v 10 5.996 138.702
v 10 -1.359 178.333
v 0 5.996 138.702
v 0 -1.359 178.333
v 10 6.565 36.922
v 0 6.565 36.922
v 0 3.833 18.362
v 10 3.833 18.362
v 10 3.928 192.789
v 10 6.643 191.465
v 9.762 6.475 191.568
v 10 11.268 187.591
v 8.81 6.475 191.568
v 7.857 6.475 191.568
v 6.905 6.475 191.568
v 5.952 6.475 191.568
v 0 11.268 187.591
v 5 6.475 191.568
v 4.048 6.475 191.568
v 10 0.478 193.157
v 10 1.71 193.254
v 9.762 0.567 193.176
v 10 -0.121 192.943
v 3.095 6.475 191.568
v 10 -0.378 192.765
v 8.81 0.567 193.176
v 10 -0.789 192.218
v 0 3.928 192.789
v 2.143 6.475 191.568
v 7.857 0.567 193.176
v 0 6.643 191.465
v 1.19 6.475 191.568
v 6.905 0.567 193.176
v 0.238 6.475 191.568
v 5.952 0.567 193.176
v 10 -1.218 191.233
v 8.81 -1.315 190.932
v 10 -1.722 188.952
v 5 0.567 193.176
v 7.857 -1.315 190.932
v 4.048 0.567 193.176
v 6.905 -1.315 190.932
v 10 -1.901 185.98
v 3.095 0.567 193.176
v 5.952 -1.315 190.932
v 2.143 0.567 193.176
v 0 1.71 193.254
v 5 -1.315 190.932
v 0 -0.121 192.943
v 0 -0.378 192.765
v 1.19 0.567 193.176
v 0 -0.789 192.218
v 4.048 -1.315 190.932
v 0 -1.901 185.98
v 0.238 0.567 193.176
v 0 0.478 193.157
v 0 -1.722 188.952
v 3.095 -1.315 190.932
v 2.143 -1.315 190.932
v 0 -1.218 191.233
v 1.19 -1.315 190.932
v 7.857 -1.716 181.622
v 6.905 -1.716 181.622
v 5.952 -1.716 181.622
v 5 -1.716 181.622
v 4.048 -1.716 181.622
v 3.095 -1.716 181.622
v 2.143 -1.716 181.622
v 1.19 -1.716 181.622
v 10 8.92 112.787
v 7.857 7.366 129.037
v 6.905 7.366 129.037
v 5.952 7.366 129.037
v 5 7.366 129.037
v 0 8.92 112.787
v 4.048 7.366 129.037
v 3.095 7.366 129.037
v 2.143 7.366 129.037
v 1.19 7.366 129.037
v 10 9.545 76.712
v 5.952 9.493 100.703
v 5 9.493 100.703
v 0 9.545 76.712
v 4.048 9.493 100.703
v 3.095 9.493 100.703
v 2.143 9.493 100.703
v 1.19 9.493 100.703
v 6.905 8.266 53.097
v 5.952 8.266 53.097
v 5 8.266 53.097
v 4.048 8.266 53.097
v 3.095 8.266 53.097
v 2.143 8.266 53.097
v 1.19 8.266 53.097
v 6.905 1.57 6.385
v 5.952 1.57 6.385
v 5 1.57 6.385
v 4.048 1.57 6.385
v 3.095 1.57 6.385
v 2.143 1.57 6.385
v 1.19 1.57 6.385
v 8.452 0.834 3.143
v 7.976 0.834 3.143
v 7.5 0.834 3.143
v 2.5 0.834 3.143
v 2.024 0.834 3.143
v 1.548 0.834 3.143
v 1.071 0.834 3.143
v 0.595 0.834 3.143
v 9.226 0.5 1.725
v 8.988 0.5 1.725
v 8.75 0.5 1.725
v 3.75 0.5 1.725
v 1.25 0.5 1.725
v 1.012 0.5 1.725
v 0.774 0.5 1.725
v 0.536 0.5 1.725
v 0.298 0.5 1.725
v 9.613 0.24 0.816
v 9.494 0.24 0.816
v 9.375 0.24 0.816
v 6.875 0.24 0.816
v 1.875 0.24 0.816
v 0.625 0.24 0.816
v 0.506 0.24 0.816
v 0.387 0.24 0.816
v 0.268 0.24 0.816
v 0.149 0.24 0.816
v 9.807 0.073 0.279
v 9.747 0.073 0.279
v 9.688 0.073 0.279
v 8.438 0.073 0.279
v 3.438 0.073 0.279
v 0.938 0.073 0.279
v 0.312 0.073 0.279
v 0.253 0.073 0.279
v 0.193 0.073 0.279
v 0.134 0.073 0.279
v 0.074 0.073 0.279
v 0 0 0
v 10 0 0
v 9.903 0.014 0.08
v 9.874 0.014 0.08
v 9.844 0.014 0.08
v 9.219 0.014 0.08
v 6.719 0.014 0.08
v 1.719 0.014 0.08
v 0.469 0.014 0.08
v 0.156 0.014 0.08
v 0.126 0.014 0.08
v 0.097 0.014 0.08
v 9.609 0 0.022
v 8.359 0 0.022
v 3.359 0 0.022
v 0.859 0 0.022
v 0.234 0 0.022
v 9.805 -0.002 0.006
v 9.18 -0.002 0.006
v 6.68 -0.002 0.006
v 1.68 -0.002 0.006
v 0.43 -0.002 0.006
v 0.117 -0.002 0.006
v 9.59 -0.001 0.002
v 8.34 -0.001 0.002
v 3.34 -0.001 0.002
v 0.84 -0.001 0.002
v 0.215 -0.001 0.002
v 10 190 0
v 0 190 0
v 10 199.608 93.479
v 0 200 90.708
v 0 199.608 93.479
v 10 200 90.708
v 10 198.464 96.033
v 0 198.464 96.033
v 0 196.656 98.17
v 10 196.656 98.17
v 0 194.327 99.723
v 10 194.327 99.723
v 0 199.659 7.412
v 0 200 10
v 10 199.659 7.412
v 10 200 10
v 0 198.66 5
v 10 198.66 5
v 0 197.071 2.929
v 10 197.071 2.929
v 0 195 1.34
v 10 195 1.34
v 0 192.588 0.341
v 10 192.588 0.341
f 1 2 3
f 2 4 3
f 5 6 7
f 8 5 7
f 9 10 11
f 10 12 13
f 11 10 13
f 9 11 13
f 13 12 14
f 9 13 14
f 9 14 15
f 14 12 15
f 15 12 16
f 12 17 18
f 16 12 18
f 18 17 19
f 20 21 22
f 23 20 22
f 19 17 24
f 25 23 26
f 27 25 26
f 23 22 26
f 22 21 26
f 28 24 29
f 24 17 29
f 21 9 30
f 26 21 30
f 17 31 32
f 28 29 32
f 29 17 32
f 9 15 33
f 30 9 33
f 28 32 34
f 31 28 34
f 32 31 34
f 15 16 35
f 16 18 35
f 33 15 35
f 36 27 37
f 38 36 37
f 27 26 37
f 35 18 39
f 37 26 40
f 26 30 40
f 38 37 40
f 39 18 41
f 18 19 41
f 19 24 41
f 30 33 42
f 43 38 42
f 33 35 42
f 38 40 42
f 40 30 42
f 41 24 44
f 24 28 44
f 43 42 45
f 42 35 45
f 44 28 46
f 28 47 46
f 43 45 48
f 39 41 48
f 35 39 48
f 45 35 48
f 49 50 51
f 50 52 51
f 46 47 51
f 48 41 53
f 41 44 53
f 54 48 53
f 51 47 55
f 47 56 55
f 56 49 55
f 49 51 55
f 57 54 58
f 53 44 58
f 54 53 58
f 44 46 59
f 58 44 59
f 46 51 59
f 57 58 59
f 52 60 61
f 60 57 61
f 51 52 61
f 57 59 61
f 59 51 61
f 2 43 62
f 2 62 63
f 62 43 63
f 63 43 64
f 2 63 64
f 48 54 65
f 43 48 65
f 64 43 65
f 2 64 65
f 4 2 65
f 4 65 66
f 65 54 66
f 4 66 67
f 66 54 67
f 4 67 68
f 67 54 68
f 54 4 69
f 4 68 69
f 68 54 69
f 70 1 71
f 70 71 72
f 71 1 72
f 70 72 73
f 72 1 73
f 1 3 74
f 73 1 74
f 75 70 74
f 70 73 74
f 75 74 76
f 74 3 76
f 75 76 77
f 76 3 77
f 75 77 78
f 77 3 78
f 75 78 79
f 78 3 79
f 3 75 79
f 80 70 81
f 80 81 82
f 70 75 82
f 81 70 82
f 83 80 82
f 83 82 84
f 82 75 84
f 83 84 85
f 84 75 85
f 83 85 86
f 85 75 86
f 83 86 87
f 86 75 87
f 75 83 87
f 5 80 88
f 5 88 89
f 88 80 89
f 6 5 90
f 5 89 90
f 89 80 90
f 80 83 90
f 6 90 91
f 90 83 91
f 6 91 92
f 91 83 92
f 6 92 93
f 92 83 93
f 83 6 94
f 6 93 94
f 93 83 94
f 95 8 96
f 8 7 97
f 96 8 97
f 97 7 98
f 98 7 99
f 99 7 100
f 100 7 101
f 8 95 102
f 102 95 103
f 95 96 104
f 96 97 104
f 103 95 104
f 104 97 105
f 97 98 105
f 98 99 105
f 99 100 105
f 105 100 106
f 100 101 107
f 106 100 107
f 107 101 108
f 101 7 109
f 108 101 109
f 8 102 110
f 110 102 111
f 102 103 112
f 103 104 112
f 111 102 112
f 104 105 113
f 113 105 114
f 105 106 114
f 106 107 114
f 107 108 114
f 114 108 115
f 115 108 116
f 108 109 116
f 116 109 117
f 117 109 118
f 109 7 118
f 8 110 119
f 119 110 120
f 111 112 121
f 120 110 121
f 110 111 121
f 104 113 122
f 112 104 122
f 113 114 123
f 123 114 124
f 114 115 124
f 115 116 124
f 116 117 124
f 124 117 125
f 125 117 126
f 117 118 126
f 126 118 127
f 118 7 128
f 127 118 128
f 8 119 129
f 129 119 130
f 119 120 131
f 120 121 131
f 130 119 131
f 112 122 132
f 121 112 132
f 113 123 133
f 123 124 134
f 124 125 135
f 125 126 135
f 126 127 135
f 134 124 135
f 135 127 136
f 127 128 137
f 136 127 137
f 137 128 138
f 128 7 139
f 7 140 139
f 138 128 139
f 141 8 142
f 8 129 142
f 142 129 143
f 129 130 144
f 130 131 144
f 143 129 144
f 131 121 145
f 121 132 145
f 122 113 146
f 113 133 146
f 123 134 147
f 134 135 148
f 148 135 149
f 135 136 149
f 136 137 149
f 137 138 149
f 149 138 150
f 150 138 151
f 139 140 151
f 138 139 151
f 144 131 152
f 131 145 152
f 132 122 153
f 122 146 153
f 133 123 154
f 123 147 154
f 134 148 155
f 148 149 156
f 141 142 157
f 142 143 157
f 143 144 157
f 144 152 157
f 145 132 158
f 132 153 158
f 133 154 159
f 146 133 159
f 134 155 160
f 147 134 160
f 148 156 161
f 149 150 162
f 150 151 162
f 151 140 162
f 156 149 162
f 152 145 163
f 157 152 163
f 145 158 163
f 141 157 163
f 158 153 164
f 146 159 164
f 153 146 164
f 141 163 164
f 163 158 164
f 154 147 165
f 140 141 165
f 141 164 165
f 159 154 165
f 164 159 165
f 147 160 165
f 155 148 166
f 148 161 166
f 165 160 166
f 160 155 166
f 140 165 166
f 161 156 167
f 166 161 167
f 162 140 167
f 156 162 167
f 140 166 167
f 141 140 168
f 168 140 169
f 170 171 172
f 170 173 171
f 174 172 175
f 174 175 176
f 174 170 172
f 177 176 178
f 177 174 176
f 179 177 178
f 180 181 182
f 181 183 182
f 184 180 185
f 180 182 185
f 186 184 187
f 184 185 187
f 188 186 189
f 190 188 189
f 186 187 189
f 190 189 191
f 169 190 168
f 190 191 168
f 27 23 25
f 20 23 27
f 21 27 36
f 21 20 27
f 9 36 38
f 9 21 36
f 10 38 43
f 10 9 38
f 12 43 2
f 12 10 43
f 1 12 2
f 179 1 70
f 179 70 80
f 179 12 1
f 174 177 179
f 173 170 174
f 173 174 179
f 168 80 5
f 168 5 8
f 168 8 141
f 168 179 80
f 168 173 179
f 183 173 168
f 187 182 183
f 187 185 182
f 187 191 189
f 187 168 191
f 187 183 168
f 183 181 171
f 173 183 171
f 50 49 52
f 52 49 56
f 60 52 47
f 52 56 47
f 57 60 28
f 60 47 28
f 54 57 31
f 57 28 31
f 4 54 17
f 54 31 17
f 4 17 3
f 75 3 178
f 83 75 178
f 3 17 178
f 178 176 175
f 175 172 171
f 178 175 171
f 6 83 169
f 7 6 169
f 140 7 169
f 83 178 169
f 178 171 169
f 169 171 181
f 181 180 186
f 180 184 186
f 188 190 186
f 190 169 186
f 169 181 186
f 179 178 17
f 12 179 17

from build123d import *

# Parameters (mm, degrees)
BOSS_EXTRUDE1_DEPTH = 10
FILLET1_R           = 10
FILLET2_R           = 10


with BuildPart() as part:
    # Sketch4 → Boss-Extrude1 (new body)
    with BuildSketch(Plane(origin=(0, 0, 0), x_dir=(0, 0, -1), z_dir=(1, 0, 0))):
        with BuildLine():
            add(Edge.make_bspline(
                [(-187.591289537, 11.268146798), (-187.910759487, 10.96376416), (-189.053363989, 9.83010396), (-190.750303118, 7.849430297), (-192.319447204, 5.292227114), (-193.121118694, 3.085900933), (-193.299910313, 1.559966185), (-193.217116114, 0.756976121), (-193.135168354, 0.364638659), (-193.047057743, 0.109527208), (-192.96639442, -0.080081172), (-192.894481628, -0.209169578), (-192.813199569, -0.32939945), (-192.711052749, -0.435970861), (-192.594950194, -0.53605079), (-192.418624979, -0.673000911), (-192.159205485, -0.827368923), (-191.743541908, -1.032510896), (-191.230986193, -1.226991107), (-189.878130351, -1.634363638), (-187.356289931, -1.931101096), (-183.363397329, -1.906833463), (-178.337477564, -1.414618093), (-172.251379163, -0.457528265), (-165.04477977, 0.971756922), (-156.672519985, 2.748116294), (-147.132421676, 4.613088792), (-136.538925287, 6.392036957), (-125.088731717, 7.921740474), (-113.043379816, 8.990800612), (-100.71648472, 9.557336848), (-88.385603015, 9.740389553), (-76.255706097, 9.588388175), (-64.510387484, 9.120060905), (-53.344960285, 8.338472651), (-42.948017549, 7.31262327), (-33.476260533, 6.153614235), (-25.038527154, 4.940692714), (-17.75658571, 3.75104804), (-11.611443602, 2.629162446), (-6.909030546, 1.71287727), (-3.100978366, 0.815909006), (-1.51759987, 0.474452698), (6.3484e-05, -0.019060108), (4.5473e-05, 0.000407463), (0, 0.000636824)],
                knots=[0.485936785, 0.485936785, 0.485936785, 0.485936785, 0.48920359, 0.497850586, 0.505193934, 0.511308341, 0.515097163, 0.516441428, 0.517272652, 0.518060388, 0.518436362, 0.518797413, 0.519153544, 0.519507976, 0.519886846, 0.520288641, 0.521160208, 0.522116283, 0.523720315, 0.52521352, 0.532574604, 0.542380648, 0.554776211, 0.56993128, 0.588004893, 0.609187965, 0.63332852, 0.660001247, 0.688743434, 0.718873444, 0.749542513, 0.780126844, 0.81020899, 0.839387288, 0.867183376, 0.893104481, 0.916760447, 0.937874173, 0.956198632, 0.971543675, 0.983762849, 0.992691516, 0.998158824, 1, 1.000020304, 1.000020304, 1.000020304, 1.000020304], degree=3))
            Line((0, 0.000636824), (0, 200))
            Line((0, 200), (-97, 200))
            Line((-97, 200), (-187.591289537, 11.268146798))
        make_face()
    extrude(amount=BOSS_EXTRUDE1_DEPTH)

    # Fillet1
    fillet1_edges = [part.edges().sort_by_distance(p)[0] for p in [
        (5, 200, 97),
    ]]
    fillet(fillet1_edges, radius=FILLET1_R)

    # Fillet2
    fillet2_edges = [part.edges().sort_by_distance(p)[0] for p in [
        (5, 200, 0),
    ]]
    fillet(fillet2_edges, radius=FILLET2_R)


solid = part.part
